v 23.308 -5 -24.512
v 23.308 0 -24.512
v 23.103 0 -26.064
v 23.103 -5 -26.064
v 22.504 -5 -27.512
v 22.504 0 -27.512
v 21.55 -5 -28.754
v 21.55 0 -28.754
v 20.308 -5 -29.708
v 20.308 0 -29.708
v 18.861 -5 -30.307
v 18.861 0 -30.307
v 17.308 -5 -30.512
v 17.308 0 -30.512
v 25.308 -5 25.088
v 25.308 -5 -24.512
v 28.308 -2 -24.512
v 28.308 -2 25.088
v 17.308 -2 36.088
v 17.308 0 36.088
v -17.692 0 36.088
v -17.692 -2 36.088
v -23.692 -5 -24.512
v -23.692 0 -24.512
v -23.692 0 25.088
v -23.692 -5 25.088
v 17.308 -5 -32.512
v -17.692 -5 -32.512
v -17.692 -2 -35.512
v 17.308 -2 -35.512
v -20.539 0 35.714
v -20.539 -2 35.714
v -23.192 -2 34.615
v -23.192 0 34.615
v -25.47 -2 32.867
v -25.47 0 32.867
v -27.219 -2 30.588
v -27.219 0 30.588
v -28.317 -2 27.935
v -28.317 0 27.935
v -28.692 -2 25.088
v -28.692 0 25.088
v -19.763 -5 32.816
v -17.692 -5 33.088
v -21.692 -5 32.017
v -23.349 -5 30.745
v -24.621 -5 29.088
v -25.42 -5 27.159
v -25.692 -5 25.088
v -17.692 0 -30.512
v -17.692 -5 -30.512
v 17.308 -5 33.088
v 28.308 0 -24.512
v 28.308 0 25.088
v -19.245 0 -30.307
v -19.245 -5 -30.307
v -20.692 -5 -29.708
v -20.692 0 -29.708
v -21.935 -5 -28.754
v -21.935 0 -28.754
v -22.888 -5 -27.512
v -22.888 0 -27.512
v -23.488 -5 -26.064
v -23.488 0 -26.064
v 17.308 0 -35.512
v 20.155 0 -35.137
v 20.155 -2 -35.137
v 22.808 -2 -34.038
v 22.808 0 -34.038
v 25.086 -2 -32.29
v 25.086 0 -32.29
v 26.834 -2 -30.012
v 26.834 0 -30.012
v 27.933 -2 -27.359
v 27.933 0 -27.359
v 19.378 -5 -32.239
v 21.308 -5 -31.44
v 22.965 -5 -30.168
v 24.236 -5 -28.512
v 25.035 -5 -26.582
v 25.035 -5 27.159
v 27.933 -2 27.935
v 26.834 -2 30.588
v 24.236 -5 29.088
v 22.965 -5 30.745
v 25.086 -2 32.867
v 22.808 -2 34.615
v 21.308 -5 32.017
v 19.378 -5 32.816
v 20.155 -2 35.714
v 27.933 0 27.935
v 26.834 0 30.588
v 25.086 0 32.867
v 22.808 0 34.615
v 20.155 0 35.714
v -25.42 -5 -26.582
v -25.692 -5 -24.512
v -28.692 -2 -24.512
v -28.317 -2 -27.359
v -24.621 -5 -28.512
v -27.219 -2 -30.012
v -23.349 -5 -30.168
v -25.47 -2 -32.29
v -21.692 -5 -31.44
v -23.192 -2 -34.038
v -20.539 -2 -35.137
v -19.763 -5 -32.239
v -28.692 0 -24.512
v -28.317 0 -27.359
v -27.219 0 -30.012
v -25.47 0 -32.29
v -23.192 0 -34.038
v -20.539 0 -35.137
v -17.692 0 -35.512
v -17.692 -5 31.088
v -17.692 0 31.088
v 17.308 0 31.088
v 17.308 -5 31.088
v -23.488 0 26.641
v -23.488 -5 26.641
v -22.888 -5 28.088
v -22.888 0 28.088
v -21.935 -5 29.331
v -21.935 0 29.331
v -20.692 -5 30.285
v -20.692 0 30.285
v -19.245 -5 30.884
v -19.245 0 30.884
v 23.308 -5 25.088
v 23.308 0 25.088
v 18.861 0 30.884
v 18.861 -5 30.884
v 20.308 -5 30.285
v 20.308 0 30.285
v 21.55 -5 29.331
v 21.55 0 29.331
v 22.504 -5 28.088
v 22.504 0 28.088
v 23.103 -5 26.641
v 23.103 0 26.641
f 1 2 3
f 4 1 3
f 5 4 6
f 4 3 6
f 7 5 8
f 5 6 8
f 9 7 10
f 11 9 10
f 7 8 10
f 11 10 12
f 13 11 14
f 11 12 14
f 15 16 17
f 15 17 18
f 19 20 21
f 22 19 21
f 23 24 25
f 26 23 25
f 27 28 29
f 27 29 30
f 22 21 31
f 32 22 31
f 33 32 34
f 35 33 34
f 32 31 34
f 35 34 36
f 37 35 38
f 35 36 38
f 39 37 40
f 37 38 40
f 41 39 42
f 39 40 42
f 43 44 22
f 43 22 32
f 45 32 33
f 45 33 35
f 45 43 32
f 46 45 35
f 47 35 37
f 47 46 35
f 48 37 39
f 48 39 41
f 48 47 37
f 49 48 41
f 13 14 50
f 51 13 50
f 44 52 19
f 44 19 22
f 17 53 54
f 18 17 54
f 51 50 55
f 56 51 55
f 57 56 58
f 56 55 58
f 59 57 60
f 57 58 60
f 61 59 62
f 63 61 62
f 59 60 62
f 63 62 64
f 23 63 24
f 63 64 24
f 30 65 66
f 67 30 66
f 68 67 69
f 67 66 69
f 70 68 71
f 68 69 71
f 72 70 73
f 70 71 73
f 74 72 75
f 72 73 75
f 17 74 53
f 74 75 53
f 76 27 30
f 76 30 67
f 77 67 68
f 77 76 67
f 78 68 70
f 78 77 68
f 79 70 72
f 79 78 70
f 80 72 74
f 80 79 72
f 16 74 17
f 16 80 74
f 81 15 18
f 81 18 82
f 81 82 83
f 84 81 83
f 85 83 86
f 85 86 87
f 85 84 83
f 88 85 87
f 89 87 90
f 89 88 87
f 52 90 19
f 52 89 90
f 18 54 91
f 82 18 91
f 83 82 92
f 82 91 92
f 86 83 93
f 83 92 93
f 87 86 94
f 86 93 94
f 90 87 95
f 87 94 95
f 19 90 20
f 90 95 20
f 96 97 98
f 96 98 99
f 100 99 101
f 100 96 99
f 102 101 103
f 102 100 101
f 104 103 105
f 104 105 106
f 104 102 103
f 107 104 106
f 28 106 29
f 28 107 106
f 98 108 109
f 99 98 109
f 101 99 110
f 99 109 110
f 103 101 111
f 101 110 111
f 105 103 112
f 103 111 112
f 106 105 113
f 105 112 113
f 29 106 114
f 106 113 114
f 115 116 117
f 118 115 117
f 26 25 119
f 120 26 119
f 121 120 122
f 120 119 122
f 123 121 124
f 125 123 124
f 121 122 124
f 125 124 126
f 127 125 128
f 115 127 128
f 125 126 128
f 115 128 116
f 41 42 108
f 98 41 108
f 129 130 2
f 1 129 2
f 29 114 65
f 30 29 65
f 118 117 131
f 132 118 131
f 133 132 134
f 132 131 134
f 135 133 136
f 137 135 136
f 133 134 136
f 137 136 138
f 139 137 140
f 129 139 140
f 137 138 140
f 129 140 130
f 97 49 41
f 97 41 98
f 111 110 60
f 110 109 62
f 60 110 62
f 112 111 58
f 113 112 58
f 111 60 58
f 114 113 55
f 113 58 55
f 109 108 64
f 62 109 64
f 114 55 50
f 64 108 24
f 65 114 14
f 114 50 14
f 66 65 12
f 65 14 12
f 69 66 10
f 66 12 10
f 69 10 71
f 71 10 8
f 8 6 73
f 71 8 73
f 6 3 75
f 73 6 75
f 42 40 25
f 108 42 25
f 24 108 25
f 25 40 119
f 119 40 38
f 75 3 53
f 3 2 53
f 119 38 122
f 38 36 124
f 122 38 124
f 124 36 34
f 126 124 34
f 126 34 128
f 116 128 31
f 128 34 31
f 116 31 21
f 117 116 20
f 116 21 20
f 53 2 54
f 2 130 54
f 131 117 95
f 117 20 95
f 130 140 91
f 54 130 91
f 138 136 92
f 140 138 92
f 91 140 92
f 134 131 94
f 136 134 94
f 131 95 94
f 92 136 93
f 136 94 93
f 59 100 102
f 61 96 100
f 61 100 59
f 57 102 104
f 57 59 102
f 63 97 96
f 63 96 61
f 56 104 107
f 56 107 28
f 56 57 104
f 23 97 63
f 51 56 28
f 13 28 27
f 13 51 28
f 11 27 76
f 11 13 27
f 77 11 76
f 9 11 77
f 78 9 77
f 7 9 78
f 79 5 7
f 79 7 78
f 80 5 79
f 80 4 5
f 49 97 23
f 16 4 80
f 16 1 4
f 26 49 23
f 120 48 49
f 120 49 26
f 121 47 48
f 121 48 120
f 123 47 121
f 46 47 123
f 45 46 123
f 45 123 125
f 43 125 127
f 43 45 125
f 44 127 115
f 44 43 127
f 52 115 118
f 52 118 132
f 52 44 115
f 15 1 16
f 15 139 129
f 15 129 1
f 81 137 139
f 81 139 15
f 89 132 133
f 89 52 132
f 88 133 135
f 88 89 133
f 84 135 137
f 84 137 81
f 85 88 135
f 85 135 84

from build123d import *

# Parameters (mm, degrees)
F1_DEPTH = 5
F2_SIZE  = 3


with BuildPart() as f1:
    # F0 (on Front) → F1 (new body)
    with BuildSketch(Plane.XZ):
        with BuildLine():
            Line((17.307692, 36.088463), (-17.692308, 36.088463))
            ThreePointArc((-17.692308, 36.088463), (-25.470484, 32.866637), (-28.692309, 25.088462))
            Line((-28.692309, 25.088462), (-28.692309, -24.511538))
            ThreePointArc((-28.692309, -24.511538), (-25.470484, -32.289714), (-17.692308, -35.51154))
            Line((-17.692308, -35.51154), (17.307692, -35.51154))
            ThreePointArc((17.307692, -35.51154), (25.085868, -32.289714), (28.307693, -24.511538))
            Line((28.307693, -24.511538), (28.307693, 25.088462))
            ThreePointArc((28.307693, 25.088462), (25.085868, 32.866637), (17.307692, 36.088463))
        make_face()
        with BuildLine():
            ThreePointArc((-23.692308, 25.088462), (-21.934949, 29.331102), (-17.692308, 31.088462))
            Line((-17.692308, 31.088462), (17.307692, 31.088462))
            ThreePointArc((17.307692, 31.088462), (21.550333, 29.331102), (23.307692, 25.088462))
            Line((23.307692, 25.088462), (23.307692, -24.511538))
            ThreePointArc((23.307692, -24.511538), (21.550333, -28.754179), (17.307692, -30.511538))
            Line((17.307692, -30.511538), (-17.692308, -30.511538))
            ThreePointArc((-17.692308, -30.511538), (-21.934949, -28.754179), (-23.692308, -24.511538))
            Line((-23.692308, -24.511538), (-23.692308, 25.088462))
        make_face(mode=Mode.SUBTRACT)
    extrude(amount=F1_DEPTH)

    # F2
    f2_edges = [f1.edges().sort_by_distance(p)[0] for p in [
        (28.307693, -5, 0.288462),
    ]]
    chamfer(f2_edges, length=F2_SIZE)


solid = f1.part
